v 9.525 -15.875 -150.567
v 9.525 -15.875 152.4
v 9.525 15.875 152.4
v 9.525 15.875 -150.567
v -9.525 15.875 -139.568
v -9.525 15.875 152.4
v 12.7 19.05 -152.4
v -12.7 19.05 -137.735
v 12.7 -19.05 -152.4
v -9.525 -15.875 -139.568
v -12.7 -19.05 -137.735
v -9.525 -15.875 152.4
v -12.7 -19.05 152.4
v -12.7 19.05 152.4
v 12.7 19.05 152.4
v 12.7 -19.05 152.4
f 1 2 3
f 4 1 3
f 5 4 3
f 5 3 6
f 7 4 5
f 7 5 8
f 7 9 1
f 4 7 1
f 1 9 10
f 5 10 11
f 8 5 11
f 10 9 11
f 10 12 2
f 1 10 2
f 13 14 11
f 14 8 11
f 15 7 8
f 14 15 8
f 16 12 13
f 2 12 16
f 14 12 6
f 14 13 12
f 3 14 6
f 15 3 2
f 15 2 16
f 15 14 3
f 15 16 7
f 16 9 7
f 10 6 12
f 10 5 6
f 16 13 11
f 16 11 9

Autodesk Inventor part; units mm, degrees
ref_plane "YZ Plane" through (0, 0, 0) normal (1, 0, 0) x (0, 1, 0)
ref_plane "XZ Plane" through (0, 0, 0) normal (0, 1, 0) x (-1, 0, 0)
ref_plane "XY Plane" through (0, 0, 0) normal (0, 0, 1) x (1, 0, 0)
sketch "Sketch1" plane through (0, 0, 0) normal (0, 0, 1) x (1, 0, 0)
  line L0 (-12.7, -19.05) -> (12.7, -19.05)
  line L1 (12.7, -19.05) -> (12.7, 19.05)
  line L2 (12.7, 19.05) -> (-12.7, 19.05)
  line L3 (-12.7, 19.05) -> (-12.7, -19.05)
  line L4 (-12.7, -19.05) -> (12.7, 19.05) construction
  line L5 (12.7, -19.05) -> (-12.7, 19.05) construction
  line L6 (-9.525, -15.875) -> (9.525, -15.875)
  line L7 (9.525, -15.875) -> (9.525, 15.875)
  line L8 (9.525, 15.875) -> (-9.525, 15.875)
  line L9 (-9.525, 15.875) -> (-9.525, -15.875)
  line L10 (-9.525, -15.875) -> (9.525, 15.875) construction
  line L11 (9.525, -15.875) -> (-9.525, 15.875) construction
  point P0 (0, 0)
  dimension "d0" = 25.4
  dimension "d1" = 38.1
  dimension "d2" = 3.175
  dimension "d3" = 3.175
extrude "Extrusion1" add sketch "Sketch1" along normal mid plane 304.8
sketch "Sketch2" plane through (-12.7, -19.05, 152.4) normal (0, -1, 0) x (1, 0, 0)
  line L0 (25.4, -304.8) -> (0, -304.8) projected
  line L1 (25.4, -304.8) -> (0, -290.1353)
  line L2 (0, 0) -> (0, -304.8) projected
  line L3 (0, -304.8) -> (0, -290.1353)
  line L4 (0, -304.8) -> (25.4, -304.8)
  line L5 (22.225, -304.8) -> (22.225, 0) projected
  point P0 (12.7, -152.4)
  dimension "d6" = 30
extrude "Extrusion2" cut sketch "Sketch2" against normal through all
properties part number "spacerForTopSideAluminumExtrusion" material "Aluminum 6061, Welded"
